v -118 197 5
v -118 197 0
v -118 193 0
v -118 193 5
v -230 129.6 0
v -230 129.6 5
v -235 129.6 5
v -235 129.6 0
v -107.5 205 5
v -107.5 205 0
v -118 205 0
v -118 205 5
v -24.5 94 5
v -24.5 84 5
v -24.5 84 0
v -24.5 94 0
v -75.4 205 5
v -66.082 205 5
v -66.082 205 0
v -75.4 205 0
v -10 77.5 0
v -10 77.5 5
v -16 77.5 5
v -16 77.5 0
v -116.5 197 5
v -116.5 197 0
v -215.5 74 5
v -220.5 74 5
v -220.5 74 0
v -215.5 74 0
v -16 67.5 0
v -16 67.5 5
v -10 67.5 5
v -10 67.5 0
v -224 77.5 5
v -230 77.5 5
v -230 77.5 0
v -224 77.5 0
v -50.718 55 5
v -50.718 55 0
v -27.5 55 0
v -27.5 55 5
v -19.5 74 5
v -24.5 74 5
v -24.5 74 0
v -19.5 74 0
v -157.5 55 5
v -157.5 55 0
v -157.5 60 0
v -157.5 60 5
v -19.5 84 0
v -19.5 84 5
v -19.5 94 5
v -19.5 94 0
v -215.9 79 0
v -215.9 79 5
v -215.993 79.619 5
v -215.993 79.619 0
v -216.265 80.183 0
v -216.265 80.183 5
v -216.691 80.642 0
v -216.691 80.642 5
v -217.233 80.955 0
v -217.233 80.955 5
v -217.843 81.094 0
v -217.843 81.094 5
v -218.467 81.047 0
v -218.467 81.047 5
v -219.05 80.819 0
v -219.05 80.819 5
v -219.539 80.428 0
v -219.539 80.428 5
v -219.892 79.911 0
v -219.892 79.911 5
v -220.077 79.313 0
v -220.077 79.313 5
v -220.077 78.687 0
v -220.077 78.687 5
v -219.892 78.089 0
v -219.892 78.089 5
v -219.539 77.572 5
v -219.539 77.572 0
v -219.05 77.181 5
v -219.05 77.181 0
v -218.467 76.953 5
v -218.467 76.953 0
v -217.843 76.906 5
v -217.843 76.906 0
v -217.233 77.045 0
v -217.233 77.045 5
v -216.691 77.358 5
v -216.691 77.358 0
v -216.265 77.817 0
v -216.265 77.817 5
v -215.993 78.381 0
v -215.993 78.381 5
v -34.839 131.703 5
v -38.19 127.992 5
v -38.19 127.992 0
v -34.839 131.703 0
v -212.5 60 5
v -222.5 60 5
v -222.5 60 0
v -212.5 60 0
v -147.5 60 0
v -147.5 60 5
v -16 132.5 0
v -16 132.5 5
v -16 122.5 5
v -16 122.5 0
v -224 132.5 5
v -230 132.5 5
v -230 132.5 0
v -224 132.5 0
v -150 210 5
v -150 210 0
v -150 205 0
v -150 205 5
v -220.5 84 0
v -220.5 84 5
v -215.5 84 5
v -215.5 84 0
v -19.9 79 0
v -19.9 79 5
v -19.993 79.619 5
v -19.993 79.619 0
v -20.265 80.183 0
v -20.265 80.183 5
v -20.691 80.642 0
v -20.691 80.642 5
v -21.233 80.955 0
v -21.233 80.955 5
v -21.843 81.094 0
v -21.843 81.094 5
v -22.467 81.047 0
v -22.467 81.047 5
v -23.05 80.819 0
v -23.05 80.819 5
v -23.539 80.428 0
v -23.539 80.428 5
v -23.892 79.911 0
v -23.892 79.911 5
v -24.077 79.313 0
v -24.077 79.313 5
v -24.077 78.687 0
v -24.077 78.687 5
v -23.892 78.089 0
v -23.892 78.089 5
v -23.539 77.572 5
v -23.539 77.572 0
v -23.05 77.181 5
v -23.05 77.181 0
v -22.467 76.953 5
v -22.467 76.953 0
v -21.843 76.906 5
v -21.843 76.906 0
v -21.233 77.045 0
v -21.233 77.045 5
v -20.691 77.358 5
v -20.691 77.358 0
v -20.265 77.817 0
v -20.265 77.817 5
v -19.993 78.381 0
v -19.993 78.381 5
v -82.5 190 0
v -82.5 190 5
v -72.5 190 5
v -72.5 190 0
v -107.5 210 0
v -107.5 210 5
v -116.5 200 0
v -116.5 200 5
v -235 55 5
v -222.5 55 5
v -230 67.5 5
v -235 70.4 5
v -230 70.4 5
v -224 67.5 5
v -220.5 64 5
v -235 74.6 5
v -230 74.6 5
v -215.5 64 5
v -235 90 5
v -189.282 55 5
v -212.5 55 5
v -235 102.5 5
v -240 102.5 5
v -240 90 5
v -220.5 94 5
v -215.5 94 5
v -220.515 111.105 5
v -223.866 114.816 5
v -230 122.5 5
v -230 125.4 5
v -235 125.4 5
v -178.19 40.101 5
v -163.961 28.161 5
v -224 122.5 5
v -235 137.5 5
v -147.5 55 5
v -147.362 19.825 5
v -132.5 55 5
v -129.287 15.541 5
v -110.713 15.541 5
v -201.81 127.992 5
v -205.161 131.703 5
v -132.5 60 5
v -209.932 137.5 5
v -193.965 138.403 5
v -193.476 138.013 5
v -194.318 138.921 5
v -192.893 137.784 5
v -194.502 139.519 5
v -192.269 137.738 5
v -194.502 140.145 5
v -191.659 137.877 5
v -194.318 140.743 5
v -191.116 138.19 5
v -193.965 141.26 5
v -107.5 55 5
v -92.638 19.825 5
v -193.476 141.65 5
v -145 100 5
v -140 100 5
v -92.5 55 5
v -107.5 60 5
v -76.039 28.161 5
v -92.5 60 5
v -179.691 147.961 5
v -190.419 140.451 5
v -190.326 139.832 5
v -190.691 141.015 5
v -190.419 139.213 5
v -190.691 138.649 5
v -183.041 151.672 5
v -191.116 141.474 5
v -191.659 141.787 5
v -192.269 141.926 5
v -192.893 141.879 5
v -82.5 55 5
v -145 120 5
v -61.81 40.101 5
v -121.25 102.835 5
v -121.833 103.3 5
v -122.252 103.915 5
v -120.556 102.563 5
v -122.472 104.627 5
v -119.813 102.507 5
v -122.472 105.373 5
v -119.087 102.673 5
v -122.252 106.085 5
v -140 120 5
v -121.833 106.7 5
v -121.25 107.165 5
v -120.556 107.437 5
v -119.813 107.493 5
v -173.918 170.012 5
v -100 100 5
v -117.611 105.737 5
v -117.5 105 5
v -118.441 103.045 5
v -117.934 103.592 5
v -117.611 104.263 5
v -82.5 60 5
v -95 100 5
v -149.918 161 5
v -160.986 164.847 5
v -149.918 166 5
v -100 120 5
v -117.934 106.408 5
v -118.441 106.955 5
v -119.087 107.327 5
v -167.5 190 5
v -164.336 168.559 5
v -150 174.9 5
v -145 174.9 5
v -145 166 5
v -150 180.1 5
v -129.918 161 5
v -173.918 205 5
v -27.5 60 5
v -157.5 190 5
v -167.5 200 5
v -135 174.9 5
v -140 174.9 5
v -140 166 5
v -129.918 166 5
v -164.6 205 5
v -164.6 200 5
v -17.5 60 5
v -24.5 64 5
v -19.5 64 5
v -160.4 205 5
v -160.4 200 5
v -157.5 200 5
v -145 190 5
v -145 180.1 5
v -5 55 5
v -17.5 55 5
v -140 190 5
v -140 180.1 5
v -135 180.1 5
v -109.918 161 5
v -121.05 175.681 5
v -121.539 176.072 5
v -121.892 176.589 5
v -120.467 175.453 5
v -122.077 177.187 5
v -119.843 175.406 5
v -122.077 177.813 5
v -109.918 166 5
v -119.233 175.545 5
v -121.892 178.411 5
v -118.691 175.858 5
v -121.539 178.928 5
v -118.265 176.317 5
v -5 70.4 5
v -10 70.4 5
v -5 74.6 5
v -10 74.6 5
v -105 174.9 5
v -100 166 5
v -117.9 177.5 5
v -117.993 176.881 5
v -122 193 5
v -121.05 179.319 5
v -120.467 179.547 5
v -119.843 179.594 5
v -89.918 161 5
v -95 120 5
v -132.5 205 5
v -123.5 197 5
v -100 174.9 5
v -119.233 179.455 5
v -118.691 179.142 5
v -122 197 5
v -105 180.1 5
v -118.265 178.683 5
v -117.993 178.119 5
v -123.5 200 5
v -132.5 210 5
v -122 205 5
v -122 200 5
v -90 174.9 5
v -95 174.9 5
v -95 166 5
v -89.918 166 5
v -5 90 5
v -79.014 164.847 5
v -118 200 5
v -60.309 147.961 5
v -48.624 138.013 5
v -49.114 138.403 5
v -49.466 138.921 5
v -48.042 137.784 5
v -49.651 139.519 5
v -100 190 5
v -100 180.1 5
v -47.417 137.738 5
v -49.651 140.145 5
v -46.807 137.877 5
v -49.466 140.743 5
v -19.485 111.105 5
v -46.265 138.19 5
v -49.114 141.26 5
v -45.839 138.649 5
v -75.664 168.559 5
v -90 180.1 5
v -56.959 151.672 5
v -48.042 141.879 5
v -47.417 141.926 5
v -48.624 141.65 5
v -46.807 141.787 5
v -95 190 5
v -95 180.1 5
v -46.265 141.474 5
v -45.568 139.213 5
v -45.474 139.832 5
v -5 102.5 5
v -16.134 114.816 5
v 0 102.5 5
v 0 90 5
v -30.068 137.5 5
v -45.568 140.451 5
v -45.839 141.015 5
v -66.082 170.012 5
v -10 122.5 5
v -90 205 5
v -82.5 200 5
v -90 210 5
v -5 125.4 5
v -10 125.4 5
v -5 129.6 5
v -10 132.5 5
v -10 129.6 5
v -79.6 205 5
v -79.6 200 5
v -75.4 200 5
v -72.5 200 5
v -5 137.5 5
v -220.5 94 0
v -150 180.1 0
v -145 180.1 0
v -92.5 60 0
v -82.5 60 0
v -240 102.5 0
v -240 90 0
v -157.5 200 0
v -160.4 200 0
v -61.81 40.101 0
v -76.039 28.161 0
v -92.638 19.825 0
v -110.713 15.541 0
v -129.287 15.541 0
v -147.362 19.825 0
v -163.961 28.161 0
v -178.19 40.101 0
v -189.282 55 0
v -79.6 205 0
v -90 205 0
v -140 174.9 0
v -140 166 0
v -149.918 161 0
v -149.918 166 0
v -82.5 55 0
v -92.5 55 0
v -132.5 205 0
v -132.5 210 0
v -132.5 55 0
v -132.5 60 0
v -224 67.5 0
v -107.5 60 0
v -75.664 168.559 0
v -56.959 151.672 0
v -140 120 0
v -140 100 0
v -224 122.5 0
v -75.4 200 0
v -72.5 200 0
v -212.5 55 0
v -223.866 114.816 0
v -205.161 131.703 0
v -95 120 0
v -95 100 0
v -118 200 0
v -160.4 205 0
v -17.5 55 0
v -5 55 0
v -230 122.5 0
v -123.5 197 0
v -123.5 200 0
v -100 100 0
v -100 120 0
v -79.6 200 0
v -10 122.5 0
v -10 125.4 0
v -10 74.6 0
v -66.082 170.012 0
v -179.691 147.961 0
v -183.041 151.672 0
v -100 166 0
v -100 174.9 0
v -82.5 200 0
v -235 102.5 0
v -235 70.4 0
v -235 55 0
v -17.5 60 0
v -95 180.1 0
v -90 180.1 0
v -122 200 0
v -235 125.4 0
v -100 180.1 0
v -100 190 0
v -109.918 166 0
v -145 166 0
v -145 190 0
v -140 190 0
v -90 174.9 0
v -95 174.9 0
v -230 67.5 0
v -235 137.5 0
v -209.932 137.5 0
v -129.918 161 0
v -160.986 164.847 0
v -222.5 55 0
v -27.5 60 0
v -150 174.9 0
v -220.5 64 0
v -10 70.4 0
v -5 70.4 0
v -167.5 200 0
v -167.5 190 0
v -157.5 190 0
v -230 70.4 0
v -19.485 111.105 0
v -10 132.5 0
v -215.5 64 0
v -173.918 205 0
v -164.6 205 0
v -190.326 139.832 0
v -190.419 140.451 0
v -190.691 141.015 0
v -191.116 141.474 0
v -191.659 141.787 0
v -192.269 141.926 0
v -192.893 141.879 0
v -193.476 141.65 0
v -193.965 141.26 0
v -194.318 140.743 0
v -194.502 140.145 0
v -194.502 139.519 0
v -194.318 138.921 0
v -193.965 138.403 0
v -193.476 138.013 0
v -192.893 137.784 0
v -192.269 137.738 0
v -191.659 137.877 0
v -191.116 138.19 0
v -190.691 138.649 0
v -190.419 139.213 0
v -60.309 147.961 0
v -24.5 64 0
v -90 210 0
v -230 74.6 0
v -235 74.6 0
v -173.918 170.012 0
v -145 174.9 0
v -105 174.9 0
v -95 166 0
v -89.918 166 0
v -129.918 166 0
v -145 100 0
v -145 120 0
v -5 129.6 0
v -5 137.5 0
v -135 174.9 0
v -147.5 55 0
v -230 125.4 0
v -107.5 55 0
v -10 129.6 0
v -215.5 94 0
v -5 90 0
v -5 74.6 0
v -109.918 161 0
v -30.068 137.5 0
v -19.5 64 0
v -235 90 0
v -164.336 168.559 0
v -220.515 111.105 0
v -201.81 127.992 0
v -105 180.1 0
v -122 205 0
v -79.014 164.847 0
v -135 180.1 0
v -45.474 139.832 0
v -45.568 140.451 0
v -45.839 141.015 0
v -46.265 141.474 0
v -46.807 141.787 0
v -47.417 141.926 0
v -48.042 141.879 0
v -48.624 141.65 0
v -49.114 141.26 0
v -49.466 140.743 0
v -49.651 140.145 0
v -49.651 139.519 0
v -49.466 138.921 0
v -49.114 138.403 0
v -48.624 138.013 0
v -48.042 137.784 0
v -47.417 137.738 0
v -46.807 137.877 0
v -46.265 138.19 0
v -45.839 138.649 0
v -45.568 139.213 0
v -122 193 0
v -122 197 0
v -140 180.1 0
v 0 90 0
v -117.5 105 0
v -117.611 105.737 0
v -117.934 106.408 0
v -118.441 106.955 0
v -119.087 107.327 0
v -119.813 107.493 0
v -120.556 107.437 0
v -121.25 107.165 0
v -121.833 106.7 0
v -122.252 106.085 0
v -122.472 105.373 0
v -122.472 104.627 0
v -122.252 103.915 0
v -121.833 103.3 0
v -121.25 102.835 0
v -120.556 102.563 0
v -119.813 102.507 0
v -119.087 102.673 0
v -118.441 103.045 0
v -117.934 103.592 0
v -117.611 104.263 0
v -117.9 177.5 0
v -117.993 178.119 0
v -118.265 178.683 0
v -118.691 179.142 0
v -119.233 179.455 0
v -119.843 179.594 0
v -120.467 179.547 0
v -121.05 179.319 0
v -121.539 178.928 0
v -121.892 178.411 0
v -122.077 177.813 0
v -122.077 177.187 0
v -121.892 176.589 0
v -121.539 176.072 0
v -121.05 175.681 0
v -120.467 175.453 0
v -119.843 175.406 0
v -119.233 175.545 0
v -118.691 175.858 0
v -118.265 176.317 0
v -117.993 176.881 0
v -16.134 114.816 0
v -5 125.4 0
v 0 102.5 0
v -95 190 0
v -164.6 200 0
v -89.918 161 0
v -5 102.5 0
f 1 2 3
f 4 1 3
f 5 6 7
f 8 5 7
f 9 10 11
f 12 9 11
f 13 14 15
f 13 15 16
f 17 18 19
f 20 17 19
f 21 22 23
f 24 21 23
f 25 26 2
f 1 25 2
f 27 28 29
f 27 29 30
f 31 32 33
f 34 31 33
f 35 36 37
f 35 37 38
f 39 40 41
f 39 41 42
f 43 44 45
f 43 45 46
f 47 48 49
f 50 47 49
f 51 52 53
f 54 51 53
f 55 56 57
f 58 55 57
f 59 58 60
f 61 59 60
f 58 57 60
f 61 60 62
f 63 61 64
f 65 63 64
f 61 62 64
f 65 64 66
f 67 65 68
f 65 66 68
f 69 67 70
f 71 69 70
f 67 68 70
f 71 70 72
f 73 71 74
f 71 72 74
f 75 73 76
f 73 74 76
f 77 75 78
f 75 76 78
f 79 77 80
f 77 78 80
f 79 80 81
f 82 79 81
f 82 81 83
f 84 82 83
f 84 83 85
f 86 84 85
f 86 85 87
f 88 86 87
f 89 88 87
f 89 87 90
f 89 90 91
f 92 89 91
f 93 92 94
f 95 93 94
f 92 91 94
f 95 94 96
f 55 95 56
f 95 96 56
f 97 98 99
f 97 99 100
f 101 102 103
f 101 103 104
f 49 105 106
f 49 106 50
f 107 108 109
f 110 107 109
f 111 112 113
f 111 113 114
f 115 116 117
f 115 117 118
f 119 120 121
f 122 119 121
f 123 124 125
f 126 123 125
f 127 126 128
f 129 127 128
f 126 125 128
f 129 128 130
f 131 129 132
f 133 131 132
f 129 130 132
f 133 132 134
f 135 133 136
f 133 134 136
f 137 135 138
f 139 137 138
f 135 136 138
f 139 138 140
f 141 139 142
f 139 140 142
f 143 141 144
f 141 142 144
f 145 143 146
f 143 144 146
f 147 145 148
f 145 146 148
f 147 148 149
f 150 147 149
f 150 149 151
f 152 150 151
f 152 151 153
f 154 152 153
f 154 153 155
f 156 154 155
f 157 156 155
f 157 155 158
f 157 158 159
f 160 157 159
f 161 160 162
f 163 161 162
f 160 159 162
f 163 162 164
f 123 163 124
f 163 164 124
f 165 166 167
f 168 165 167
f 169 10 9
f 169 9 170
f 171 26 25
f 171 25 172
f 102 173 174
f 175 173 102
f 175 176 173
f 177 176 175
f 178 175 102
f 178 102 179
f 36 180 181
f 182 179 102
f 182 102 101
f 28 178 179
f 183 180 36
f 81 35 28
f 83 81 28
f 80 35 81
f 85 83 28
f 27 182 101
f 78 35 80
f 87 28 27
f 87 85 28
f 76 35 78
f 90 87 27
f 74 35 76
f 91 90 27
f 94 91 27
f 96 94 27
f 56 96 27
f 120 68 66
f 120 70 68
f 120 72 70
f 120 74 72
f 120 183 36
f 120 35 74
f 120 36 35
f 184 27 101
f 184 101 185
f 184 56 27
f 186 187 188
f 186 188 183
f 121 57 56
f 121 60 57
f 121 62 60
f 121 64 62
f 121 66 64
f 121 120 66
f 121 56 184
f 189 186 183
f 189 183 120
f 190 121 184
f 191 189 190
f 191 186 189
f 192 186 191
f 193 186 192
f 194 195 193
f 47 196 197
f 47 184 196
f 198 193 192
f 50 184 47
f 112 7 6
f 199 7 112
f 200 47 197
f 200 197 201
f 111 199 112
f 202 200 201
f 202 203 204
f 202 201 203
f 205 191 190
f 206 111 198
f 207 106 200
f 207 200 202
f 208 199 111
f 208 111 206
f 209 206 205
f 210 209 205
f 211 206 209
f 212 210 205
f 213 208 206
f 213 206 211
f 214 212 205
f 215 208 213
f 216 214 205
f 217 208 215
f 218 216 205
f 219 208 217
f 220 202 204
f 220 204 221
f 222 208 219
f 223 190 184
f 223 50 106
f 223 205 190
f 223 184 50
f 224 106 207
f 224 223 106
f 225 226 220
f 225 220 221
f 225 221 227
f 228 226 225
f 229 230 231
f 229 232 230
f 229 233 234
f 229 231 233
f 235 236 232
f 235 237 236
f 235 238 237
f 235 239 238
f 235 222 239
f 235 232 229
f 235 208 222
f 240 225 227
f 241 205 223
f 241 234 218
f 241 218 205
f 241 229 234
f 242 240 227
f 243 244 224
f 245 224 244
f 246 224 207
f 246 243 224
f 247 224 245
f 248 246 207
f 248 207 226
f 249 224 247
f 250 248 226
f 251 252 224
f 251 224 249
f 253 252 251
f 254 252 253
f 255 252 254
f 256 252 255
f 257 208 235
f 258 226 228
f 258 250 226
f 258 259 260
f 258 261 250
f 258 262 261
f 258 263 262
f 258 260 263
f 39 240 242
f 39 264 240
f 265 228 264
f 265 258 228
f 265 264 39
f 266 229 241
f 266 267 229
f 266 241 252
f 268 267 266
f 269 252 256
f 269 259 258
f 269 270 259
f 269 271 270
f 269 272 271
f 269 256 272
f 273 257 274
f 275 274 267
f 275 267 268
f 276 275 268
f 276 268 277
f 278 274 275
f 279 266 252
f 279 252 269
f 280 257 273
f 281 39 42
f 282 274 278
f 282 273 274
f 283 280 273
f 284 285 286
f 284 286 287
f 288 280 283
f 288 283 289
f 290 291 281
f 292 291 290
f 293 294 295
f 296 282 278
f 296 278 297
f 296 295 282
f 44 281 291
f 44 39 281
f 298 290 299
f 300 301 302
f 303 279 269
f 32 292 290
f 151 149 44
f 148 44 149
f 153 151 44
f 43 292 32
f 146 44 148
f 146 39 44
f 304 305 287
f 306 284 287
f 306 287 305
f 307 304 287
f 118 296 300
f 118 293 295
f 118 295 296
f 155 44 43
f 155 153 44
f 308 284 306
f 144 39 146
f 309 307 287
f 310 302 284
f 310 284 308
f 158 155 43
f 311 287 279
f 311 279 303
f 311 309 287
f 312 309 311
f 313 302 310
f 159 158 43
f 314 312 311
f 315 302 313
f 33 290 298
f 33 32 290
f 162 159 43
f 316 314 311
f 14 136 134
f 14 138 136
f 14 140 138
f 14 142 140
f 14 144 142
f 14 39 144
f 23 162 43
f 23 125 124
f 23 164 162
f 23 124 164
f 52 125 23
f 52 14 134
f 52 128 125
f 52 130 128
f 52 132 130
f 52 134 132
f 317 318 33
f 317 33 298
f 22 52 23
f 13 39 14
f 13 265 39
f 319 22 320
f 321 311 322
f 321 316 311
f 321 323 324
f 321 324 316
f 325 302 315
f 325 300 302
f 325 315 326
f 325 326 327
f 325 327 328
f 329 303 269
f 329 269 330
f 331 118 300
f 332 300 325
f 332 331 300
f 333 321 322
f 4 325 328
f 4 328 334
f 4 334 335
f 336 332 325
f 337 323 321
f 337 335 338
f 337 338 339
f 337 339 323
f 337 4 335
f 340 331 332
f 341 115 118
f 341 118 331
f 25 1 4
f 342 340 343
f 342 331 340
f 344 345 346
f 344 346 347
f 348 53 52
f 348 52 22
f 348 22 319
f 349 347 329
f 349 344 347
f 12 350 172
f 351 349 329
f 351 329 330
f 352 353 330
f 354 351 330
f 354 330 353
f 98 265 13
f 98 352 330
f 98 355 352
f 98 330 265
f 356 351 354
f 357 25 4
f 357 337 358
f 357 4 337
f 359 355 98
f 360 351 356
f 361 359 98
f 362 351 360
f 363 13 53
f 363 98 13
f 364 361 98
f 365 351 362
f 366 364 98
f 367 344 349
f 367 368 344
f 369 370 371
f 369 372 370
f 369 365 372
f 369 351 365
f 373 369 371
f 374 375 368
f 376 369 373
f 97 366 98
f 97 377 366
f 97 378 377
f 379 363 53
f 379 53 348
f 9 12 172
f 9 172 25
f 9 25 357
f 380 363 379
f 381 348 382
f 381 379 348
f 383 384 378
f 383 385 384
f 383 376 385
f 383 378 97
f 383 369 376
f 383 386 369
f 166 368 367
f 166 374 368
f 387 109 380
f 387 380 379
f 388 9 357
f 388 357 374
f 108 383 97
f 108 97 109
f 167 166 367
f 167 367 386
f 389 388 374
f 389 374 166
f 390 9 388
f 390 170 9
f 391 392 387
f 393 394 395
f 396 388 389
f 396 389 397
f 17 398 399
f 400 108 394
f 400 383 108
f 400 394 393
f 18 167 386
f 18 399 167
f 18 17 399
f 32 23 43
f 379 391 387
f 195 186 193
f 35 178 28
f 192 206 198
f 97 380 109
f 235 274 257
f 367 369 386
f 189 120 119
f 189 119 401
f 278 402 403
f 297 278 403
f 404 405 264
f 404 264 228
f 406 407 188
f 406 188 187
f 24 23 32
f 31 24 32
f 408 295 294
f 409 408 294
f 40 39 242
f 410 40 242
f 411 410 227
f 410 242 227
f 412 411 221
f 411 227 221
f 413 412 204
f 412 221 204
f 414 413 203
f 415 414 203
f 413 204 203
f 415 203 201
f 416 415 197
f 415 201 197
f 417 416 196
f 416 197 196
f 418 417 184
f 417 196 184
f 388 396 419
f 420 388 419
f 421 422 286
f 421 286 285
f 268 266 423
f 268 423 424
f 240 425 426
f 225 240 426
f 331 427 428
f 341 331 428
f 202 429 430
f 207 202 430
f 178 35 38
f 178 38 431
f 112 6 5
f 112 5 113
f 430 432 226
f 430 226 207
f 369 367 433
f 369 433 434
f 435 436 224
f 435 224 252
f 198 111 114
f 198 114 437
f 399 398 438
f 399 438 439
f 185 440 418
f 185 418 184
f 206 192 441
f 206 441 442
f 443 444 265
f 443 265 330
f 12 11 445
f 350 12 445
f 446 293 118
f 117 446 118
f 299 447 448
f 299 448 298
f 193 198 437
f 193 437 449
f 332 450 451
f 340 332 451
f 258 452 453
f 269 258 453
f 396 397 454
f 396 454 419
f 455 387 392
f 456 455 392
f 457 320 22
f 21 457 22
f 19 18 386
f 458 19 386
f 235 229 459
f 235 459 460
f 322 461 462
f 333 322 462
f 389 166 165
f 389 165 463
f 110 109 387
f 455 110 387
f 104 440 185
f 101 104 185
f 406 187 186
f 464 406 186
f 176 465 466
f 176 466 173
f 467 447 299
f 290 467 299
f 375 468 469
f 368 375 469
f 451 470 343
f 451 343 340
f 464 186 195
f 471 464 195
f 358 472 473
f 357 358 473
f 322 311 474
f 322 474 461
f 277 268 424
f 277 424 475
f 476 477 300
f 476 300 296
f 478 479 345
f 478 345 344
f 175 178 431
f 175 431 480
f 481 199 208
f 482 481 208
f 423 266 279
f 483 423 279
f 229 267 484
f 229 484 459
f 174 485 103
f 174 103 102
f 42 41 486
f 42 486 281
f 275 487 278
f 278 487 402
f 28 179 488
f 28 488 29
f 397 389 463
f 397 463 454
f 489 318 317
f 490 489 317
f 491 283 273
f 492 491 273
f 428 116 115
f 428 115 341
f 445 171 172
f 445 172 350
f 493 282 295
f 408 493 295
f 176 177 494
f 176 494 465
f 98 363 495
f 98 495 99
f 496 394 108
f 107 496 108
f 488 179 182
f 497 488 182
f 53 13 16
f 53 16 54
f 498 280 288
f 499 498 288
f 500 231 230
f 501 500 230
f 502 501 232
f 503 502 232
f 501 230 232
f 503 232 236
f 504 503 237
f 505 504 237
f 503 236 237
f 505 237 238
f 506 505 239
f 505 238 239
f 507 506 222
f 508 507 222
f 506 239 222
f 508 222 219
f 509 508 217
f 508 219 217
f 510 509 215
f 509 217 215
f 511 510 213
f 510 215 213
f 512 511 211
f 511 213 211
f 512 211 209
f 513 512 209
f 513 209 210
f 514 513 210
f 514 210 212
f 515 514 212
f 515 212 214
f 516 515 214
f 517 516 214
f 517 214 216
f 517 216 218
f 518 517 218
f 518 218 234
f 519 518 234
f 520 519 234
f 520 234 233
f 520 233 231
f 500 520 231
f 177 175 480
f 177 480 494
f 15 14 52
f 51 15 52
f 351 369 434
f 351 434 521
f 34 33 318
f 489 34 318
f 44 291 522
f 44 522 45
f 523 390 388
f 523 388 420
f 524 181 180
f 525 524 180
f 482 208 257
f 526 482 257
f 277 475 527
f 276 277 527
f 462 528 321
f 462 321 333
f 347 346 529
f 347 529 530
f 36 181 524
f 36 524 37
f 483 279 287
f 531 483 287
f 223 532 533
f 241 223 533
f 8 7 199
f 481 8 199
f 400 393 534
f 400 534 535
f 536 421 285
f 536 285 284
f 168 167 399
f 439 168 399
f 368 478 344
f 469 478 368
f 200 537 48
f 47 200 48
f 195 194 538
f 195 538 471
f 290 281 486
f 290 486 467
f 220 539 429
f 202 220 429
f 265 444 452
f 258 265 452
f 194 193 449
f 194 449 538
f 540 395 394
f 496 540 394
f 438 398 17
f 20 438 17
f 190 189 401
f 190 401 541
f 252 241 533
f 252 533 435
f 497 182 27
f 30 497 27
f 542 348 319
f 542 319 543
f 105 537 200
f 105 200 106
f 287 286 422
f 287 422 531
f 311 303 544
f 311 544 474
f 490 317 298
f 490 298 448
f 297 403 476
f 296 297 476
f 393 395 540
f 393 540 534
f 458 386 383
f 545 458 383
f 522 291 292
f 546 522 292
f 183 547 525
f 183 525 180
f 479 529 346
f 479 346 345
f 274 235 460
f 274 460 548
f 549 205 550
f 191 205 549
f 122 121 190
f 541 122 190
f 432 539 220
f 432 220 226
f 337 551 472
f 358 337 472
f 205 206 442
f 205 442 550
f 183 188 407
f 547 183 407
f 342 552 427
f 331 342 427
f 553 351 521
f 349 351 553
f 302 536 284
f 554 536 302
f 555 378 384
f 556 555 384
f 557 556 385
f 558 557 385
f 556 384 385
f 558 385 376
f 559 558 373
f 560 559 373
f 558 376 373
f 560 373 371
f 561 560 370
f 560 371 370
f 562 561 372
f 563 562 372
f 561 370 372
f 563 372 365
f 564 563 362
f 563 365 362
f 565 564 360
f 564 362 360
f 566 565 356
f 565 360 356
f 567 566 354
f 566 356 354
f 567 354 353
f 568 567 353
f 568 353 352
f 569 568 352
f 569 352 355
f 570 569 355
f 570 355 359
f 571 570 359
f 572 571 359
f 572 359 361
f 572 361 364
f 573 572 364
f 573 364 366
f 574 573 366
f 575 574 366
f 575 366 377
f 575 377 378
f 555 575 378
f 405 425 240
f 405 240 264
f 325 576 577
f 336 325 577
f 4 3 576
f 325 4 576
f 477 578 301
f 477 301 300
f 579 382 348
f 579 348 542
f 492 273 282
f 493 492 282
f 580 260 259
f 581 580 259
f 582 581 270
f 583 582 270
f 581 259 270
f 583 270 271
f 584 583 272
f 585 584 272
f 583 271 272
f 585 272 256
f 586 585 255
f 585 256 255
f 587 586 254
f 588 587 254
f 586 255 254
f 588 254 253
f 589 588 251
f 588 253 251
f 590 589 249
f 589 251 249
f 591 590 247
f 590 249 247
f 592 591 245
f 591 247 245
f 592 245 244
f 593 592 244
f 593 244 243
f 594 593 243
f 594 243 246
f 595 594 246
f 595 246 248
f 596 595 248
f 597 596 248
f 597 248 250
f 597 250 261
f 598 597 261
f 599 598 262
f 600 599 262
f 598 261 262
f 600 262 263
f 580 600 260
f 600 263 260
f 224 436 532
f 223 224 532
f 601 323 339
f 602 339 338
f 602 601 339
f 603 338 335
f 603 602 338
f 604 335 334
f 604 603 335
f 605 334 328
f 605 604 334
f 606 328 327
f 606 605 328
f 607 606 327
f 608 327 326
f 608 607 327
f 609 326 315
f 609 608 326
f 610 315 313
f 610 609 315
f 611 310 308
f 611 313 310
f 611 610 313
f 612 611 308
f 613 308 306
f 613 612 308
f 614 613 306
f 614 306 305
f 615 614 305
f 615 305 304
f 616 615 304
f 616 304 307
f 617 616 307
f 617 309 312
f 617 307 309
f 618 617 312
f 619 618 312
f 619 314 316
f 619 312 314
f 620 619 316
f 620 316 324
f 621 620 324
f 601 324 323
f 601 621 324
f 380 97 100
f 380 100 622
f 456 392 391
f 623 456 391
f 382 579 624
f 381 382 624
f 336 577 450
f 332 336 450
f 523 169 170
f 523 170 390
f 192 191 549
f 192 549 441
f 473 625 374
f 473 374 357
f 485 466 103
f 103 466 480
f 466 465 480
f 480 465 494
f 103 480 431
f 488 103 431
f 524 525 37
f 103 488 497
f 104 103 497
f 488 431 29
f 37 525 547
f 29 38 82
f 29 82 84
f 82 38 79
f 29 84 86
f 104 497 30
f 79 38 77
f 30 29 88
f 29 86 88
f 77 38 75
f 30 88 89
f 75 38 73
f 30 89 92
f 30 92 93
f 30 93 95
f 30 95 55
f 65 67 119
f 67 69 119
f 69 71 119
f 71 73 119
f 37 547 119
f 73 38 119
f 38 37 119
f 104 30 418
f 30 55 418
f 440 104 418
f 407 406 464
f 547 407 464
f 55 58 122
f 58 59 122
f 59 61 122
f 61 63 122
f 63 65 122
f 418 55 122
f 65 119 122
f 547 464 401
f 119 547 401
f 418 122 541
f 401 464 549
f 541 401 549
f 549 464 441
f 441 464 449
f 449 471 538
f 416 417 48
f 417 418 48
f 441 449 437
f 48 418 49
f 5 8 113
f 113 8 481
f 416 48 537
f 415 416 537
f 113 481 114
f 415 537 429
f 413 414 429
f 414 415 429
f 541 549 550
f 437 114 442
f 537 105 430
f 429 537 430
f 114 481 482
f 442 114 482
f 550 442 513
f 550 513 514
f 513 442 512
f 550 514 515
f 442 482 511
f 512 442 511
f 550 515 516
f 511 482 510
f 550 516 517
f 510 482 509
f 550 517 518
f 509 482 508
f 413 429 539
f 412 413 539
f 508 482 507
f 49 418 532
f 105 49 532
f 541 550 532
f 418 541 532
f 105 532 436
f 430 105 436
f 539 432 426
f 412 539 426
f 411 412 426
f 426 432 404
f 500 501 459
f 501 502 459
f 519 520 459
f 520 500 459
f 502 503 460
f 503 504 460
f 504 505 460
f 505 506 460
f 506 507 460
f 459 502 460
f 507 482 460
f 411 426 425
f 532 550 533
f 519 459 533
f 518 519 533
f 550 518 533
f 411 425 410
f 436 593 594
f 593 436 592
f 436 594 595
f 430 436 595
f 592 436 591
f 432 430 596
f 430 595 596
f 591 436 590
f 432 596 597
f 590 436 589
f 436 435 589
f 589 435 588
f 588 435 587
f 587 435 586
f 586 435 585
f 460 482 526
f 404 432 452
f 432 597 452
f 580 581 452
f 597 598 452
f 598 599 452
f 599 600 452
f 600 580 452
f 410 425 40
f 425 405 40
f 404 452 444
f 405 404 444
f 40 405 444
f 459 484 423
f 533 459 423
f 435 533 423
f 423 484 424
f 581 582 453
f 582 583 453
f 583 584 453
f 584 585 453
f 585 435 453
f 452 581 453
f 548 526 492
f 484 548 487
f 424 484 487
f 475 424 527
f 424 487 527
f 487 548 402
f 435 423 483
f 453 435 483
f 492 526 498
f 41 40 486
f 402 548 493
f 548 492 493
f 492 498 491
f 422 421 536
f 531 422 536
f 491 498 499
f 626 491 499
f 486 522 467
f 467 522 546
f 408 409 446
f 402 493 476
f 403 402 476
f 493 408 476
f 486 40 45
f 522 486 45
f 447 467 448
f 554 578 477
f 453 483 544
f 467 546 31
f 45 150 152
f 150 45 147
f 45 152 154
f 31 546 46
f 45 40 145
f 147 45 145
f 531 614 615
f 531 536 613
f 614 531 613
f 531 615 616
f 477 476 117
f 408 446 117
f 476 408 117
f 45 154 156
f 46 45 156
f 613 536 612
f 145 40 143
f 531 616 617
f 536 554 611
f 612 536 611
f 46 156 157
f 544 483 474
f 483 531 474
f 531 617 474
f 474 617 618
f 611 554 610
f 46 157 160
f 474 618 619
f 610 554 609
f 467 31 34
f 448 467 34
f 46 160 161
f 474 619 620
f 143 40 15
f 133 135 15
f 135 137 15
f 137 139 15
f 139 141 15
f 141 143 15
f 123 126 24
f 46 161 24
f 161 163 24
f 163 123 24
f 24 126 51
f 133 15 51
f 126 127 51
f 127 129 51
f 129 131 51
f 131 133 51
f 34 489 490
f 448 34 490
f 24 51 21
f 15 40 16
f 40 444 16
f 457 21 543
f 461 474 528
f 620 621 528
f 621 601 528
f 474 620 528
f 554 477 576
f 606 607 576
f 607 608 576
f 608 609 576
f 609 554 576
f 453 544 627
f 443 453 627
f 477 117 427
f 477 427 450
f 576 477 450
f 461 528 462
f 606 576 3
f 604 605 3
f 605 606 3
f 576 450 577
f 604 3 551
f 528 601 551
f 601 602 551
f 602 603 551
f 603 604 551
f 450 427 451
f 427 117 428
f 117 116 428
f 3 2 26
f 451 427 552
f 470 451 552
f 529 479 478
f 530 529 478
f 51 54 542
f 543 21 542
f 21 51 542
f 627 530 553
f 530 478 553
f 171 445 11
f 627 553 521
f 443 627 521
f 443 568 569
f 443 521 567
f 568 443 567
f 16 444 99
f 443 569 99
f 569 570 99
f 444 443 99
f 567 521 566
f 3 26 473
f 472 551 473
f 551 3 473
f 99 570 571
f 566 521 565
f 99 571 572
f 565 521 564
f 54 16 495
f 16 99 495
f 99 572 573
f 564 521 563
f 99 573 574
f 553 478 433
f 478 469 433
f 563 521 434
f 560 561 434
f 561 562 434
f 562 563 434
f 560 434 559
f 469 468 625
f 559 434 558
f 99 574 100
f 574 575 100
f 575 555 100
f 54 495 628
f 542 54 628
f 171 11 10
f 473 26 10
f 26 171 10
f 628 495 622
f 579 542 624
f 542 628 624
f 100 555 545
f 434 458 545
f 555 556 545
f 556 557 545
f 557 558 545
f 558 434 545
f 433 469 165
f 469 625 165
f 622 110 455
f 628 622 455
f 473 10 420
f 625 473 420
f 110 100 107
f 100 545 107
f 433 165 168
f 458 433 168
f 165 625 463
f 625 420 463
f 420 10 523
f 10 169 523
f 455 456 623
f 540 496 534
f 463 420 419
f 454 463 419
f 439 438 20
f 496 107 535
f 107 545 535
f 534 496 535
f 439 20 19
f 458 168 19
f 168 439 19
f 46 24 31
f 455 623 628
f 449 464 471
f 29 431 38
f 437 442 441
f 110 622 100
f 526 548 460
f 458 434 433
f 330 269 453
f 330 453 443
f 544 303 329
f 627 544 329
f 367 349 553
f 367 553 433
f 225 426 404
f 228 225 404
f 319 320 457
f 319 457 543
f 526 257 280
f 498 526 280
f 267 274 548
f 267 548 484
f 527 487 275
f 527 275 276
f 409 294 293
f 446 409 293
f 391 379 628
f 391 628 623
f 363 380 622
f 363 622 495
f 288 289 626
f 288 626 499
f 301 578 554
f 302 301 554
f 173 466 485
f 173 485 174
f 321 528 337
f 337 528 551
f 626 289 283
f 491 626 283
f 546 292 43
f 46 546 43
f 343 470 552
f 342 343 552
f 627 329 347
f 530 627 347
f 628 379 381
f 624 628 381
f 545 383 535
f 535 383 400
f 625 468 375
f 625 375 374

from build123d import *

# Parameters (mm, degrees)
SKETCH1_W            = 240
SKETCH1_H            = 210
BOSS_EXTRUDE1_DEPTH  = 5
SKETCH2_W            = 240
SKETCH2_H            = 65
CUT_EXTRUDE1_DEPTH   = 5
SKETCH4_W            = 100
SKETCH4_H            = 5
BOSS_EXTRUDE2_DEPTH  = 10
SKETCH5_W            = 5
SKETCH5_H            = 35
SKETCH5_W_2          = 60
SKETCH5_H_2          = 5
CUT_EXTRUDE3_DEPTH   = 10
SKETCH6_W            = 5
SKETCH6_H            = 10
BOSS_EXTRUDE3_DEPTH  = 15
BOSS_EXTRUDE9_DEPTH  = 5
SKETCH13_W           = 5
SKETCH13_H           = 35
CUT_EXTRUDE4_DEPTH   = 10
SKETCH15_R           = 2.1
SKETCH15_W           = 15
SKETCH15_H           = 5.2
CUT_EXTRUDE8_DEPTH   = 10
SKETCH16_R           = 2.1
CUT_EXTRUDE9_DEPTH   = 10
SKETCH17_W           = 25
SKETCH17_H           = 5
SKETCH17_W_2         = 10
CUT_EXTRUDE10_DEPTH  = 10
SKETCH19_W           = 25
SKETCH19_H           = 5
SKETCH19_W_2         = 4
SKETCH19_H_2         = 3
SKETCH19_H_3         = 4
SKETCH19_W_3         = 1.5
CUT_EXTRUDE12_DEPTH  = 10
CUT_EXTRUDE13_DEPTH  = 10
SKETCH21_W           = 5
SKETCH21_H           = 25
CUT_EXTRUDE14_DEPTH  = 5
SKETCH22_W           = 5
SKETCH22_H           = 4.2
CUT_EXTRUDE15_DEPTH  = 5
SKETCH23_W           = 5
SKETCH23_H           = 25
CUT_EXTRUDE16_DEPTH  = 10
SKETCH24_W           = 5
SKETCH24_H           = 5
BOSS_EXTRUDE10_DEPTH = 5
SKETCH26_W           = 5
SKETCH26_H           = 5
BOSS_EXTRUDE12_DEPTH = 5
SKETCH27_R           = 2.5
CUT_EXTRUDE17_DEPTH  = 5
SKETCH28_W           = 5
SKETCH28_H           = 5
CUT_EXTRUDE18_DEPTH  = 10
SKETCH29_W           = 5
SKETCH29_H           = 5
CUT_EXTRUDE19_DEPTH  = 10
SKETCH30_W           = 10
SKETCH30_H           = 8.2
SKETCH30_W_2         = 4.2
SKETCH30_H_2         = 5
CUT_EXTRUDE20_DEPTH  = 10
SKETCH31_W           = 10
SKETCH31_H           = 5
CUT_EXTRUDE21_DEPTH  = 5
SKETCH32_W           = 20
SKETCH32_H           = 5
CUT_EXTRUDE22_DEPTH  = 5
SKETCH33_W           = 10
SKETCH33_H           = 1.8
CUT_EXTRUDE23_DEPTH  = 5
SKETCH34_R           = 2.1
SKETCH34_W           = 5
SKETCH34_H           = 10
CUT_EXTRUDE24_DEPTH  = 5


with BuildPart() as part:
    # Sketch1 → Boss-Extrude1 (new body)
    with BuildSketch(Plane.XY):
        with Locations((-120, 105)):
            Rectangle(SKETCH1_W, SKETCH1_H)
    extrude(amount=BOSS_EXTRUDE1_DEPTH)

    # Sketch2 → Cut-Extrude1 (cut)
    with BuildSketch(Plane.XY.offset(5)):
        with Locations((-120, 32.5)):
            Rectangle(SKETCH2_W, SKETCH2_H)
    extrude(amount=-CUT_EXTRUDE1_DEPTH, mode=Mode.SUBTRACT)

    # Sketch4 → Boss-Extrude2 (add)
    with BuildSketch(Plane.XZ.offset(-65)):
        with Locations((-170, 2.5)):
            Rectangle(SKETCH4_W, SKETCH4_H)
        with Locations((-70, 2.5)):
            Rectangle(SKETCH4_W, SKETCH4_H)
    extrude(amount=BOSS_EXTRUDE2_DEPTH)

    # Sketch5 → Cut-Extrude3 (cut)
    with BuildSketch(Plane.XY.offset(5)):
        with Locations((-237.5, 192.5)):
            Rectangle(SKETCH5_W, SKETCH5_H)
        with Locations((-2.5, 192.5)):
            Rectangle(SKETCH5_W, SKETCH5_H)
        with Locations((-50, 207.5)):
            Rectangle(SKETCH5_W_2, SKETCH5_H_2)
        with Locations((-190, 207.5)):
            Rectangle(SKETCH5_W_2, SKETCH5_H_2)
    extrude(amount=-CUT_EXTRUDE3_DEPTH, mode=Mode.SUBTRACT)

    # Sketch6 → Boss-Extrude3 (add)
    with BuildSketch(Plane.ZY.offset(220)):
        with Locations((2.5, 60)):
            Rectangle(SKETCH6_W, SKETCH6_H)
    boss_extrude3 = extrude(amount=BOSS_EXTRUDE3_DEPTH)

    # Mirror1: Boss-Extrude3 across plane
    add(boss_extrude3.mirror(Plane.ZY.offset(120)))

    # Sketch12 → Boss-Extrude9 (add)
    with BuildSketch(Plane.XY.offset(5)):
        with BuildLine():
            Line((-189.282032303, 55), (-50.717967697, 55))
            ThreePointArc((-50.717967697, 55), (-120, 15), (-189.282032303, 55))
        make_face()
    extrude(amount=-BOSS_EXTRUDE9_DEPTH)

    # Sketch13 → Cut-Extrude4 (cut)
    with BuildSketch(Plane.XY.offset(5)):
        with Locations((-237.5, 120)):
            Rectangle(SKETCH13_W, SKETCH13_H)
        with Locations((-2.5, 120)):
            Rectangle(SKETCH13_W, SKETCH13_H)
    extrude(amount=-CUT_EXTRUDE4_DEPTH, mode=Mode.SUBTRACT)

    # Sketch15 → Cut-Extrude8 (cut)
    with BuildSketch(Plane.XY):
        with Locations((-120, 177.5)):
            Circle(SKETCH15_R)
        with Locations((-142.5, 177.5)):
            Rectangle(SKETCH15_W, SKETCH15_H)
        with Locations((-97.5, 177.5)):
            Rectangle(SKETCH15_W, SKETCH15_H)
    extrude(amount=CUT_EXTRUDE8_DEPTH, mode=Mode.SUBTRACT)

    # Sketch16 → Cut-Extrude9 (cut)
    with BuildSketch(Plane.XY.offset(5)):
        Polygon((-160.98556701, 164.847268071), (-179.690721649, 147.960670133), (-183.041237113, 151.672010339), (-164.336082474, 168.558608278), align=None)
        Polygon((-201.810309278, 127.991597968), (-220.515463918, 111.10500003), (-223.865979381, 114.816340236), (-205.160824742, 131.702938175), align=None)
        with Locations((-192.425773196, 139.831804154)):
            Circle(SKETCH16_R)
        Polygon((-75.663917526, 168.558608278), (-56.958762887, 151.672010339), (-60.309278351, 147.960670133), (-79.01443299, 164.847268071), align=None)
        with Locations((-47.574226804, 139.831804154)):
            Circle(SKETCH16_R)
        Polygon((-34.839175258, 131.702938175), (-16.134020619, 114.816340236), (-19.484536082, 111.10500003), (-38.189690722, 127.991597968), align=None)
    extrude(amount=-CUT_EXTRUDE9_DEPTH, mode=Mode.SUBTRACT)

    # Sketch17 → Cut-Extrude10 (cut)
    with BuildSketch(Plane(origin=(0, 0, 0), x_dir=(-1, 0, 0), z_dir=(0, 0, -1))):
        with Locations((120, 57.5)):
            Rectangle(SKETCH17_W, SKETCH17_H)
        with Locations((152.5, 57.5)):
            Rectangle(SKETCH17_W_2, SKETCH17_H)
        with Locations((87.5, 57.5)):
            Rectangle(SKETCH17_W_2, SKETCH17_H)
    extrude(amount=-CUT_EXTRUDE10_DEPTH, mode=Mode.SUBTRACT)

    # Sketch19 → Cut-Extrude12 (cut)
    with BuildSketch(Plane(origin=(0, 0, 0), x_dir=(-1, 0, 0), z_dir=(0, 0, -1))):
        with Locations((120, 207.5)):
            Rectangle(SKETCH19_W, SKETCH19_H)
        with Locations((120, 202.5)):
            Rectangle(SKETCH19_W_2, SKETCH19_H)
        with Locations((120, 198.5)):
            Rectangle(SKETCH19_W_2, SKETCH19_H_2)
        with Locations((120, 195)):
            Rectangle(SKETCH19_W_2, SKETCH19_H_3)
        with Locations((122.75, 198.5)):
            Rectangle(SKETCH19_W_3, SKETCH19_H_2)
        with Locations((117.25, 198.5)):
            Rectangle(SKETCH19_W_3, SKETCH19_H_2)
    extrude(amount=-CUT_EXTRUDE12_DEPTH, mode=Mode.SUBTRACT)

    # Sketch20 → Cut-Extrude13 (cut)
    with BuildSketch(Plane.XY.offset(5)):
        Polygon((-273.079166664, 137.5), (-209.931771643, 137.5), (-173.918106282, 170.012336785), (-173.918106282, 219.696537232), (-273.079166664, 219.696537232), align=None)
        Polygon((33.079166664, 137.5), (33.079166664, 219.696537232), (-66.081893718, 219.696537232), (-66.081893718, 170.012336785), (-30.068228357, 137.5), align=None)
    extrude(amount=-CUT_EXTRUDE13_DEPTH, mode=Mode.SUBTRACT)

    # Sketch21 → Cut-Extrude14 (cut)
    with BuildSketch(Plane(origin=(0, 0, 0), x_dir=(0, 0, -1), z_dir=(1, 0, 0))):
        with Locations((-2.5, 77.5)):
            Rectangle(SKETCH21_W, SKETCH21_H)
    cut_extrude14 = extrude(amount=-CUT_EXTRUDE14_DEPTH, mode=Mode.SUBTRACT)

    # Mirror2: Cut-Extrude14 across plane
    add(cut_extrude14.mirror(Plane.ZY.offset(120)), mode=Mode.SUBTRACT)

    # Sketch22 → Cut-Extrude15 (cut)
    with BuildSketch(Plane.XY.offset(5)):
        with Locations((-7.5, 72.5)):
            Rectangle(SKETCH22_W, SKETCH22_H)
        with Locations((-7.5, 127.5)):
            Rectangle(SKETCH22_W, SKETCH22_H)
        Polygon((-10, 67.5), (-10, 70.4), (-10, 74.6), (-10, 77.5), (-16, 77.5), (-16, 67.5), align=None)
        Polygon((-10, 125.4), (-10, 129.6), (-10, 132.5), (-16, 132.5), (-16, 122.5), (-10, 122.5), align=None)
    cut_extrude15 = extrude(amount=-CUT_EXTRUDE15_DEPTH, mode=Mode.SUBTRACT)

    # Mirror3: Cut-Extrude15 across plane
    add(cut_extrude15.mirror(Plane(origin=(-120, 0, 0), x_dir=(0, 0, 1), z_dir=(1, 0, 0))), mode=Mode.SUBTRACT)

    # Sketch23 → Cut-Extrude16 (cut)
    with BuildSketch(Plane(origin=(0, 0, 0), x_dir=(-1, 0, 0), z_dir=(0, 0, -1))):
        with Locations((142.5, 112.5)):
            Rectangle(SKETCH23_W, SKETCH23_H)
        with Locations((97.5, 112.5)):
            Rectangle(SKETCH23_W, SKETCH23_H)
        with Locations((142.5, 177.5)):
            Rectangle(SKETCH23_W, SKETCH23_H)
        with Locations((97.5, 177.5)):
            Rectangle(SKETCH23_W, SKETCH23_H)
    extrude(amount=-CUT_EXTRUDE16_DEPTH, mode=Mode.SUBTRACT)

    # Sketch24 → Boss-Extrude10 (add)
    with BuildSketch(Plane.XY.offset(5)):
        with Locations((-97.5, 122.5)):
            Rectangle(SKETCH24_W, SKETCH24_H)
    extrude(amount=-BOSS_EXTRUDE10_DEPTH)

    # Sketch26 → Boss-Extrude12 (add)
    with BuildSketch(Plane.XY.offset(5)):
        with Locations((-142.5, 122.5)):
            Rectangle(SKETCH26_W, SKETCH26_H)
    extrude(amount=-BOSS_EXTRUDE12_DEPTH)

    # Sketch27 → Cut-Extrude17 (cut)
    with BuildSketch(Plane.XY.offset(5)):
        with Locations((-120, 105)):
            Circle(SKETCH27_R)
    extrude(amount=-CUT_EXTRUDE17_DEPTH, mode=Mode.SUBTRACT)

    # Sketch28 → Cut-Extrude18 (cut)
    with BuildSketch(Plane.ZY.offset(160)):
        with Locations((2.5, 207.5)):
            Rectangle(SKETCH28_W, SKETCH28_H)
    extrude(amount=-CUT_EXTRUDE18_DEPTH, mode=Mode.SUBTRACT)

    # Sketch29 → Cut-Extrude19 (cut)
    with BuildSketch(Plane(origin=(-80, 0, 0), x_dir=(0, 0, -1), z_dir=(1, 0, 0))):
        with Locations((-2.5, 207.5)):
            Rectangle(SKETCH29_W, SKETCH29_H)
    extrude(amount=-CUT_EXTRUDE19_DEPTH, mode=Mode.SUBTRACT)

    # Sketch30 → Cut-Extrude20 (cut)
    with BuildSketch(Plane.XY.offset(5)):
        with Locations((-77.5, 195.9)):
            Rectangle(SKETCH30_W, SKETCH30_H)
        with Locations((-77.5, 202.5)):
            Rectangle(SKETCH30_W_2, SKETCH30_H_2)
        Polygon((-157.5, 200), (-160.4, 200), (-164.6, 200), (-167.5, 200), (-167.5, 191.8), (-157.5, 191.8), align=None)
        with Locations((-162.5, 202.5)):
            Rectangle(SKETCH30_W_2, SKETCH30_H_2)
    extrude(amount=-CUT_EXTRUDE20_DEPTH, mode=Mode.SUBTRACT)

    # Sketch31 → Cut-Extrude21 (cut)
    with BuildSketch(Plane.XZ.offset(-55)):
        with Locations((-217.5, 2.5)):
            Rectangle(SKETCH31_W, SKETCH31_H)
        with Locations((-22.5, 2.5)):
            Rectangle(SKETCH31_W, SKETCH31_H)
    extrude(amount=-CUT_EXTRUDE21_DEPTH, mode=Mode.SUBTRACT)

    # Sketch32 → Cut-Extrude22 (cut)
    with BuildSketch(Plane.XY.offset(5)):
        with Locations((-139.918106282, 163.5)):
            Rectangle(SKETCH32_W, SKETCH32_H)
        with Locations((-99.918106282, 163.5)):
            Rectangle(SKETCH32_W, SKETCH32_H)
    extrude(amount=-CUT_EXTRUDE22_DEPTH, mode=Mode.SUBTRACT)

    # Sketch33 → Cut-Extrude23 (cut)
    with BuildSketch(Plane.XY.offset(5)):
        with Locations((-162.5, 190.9)):
            Rectangle(SKETCH33_W, SKETCH33_H)
        with Locations((-77.5, 190.9)):
            Rectangle(SKETCH33_W, SKETCH33_H)
    extrude(amount=-CUT_EXTRUDE23_DEPTH, mode=Mode.SUBTRACT)

    # Sketch34 → Cut-Extrude24 (cut)
    with BuildSketch(Plane.XY.offset(5)):
        with Locations((-218, 79)):
            Circle(SKETCH34_R)
        with Locations((-22, 79)):
            Circle(SKETCH34_R)
        with Locations((-218, 69)):
            Rectangle(SKETCH34_W, SKETCH34_H)
        with Locations((-218, 89)):
            Rectangle(SKETCH34_W, SKETCH34_H)
        with Locations((-22, 89)):
            Rectangle(SKETCH34_W, SKETCH34_H)
        with Locations((-22, 69)):
            Rectangle(SKETCH34_W, SKETCH34_H)
    extrude(amount=-CUT_EXTRUDE24_DEPTH, mode=Mode.SUBTRACT)


solid = part.part
